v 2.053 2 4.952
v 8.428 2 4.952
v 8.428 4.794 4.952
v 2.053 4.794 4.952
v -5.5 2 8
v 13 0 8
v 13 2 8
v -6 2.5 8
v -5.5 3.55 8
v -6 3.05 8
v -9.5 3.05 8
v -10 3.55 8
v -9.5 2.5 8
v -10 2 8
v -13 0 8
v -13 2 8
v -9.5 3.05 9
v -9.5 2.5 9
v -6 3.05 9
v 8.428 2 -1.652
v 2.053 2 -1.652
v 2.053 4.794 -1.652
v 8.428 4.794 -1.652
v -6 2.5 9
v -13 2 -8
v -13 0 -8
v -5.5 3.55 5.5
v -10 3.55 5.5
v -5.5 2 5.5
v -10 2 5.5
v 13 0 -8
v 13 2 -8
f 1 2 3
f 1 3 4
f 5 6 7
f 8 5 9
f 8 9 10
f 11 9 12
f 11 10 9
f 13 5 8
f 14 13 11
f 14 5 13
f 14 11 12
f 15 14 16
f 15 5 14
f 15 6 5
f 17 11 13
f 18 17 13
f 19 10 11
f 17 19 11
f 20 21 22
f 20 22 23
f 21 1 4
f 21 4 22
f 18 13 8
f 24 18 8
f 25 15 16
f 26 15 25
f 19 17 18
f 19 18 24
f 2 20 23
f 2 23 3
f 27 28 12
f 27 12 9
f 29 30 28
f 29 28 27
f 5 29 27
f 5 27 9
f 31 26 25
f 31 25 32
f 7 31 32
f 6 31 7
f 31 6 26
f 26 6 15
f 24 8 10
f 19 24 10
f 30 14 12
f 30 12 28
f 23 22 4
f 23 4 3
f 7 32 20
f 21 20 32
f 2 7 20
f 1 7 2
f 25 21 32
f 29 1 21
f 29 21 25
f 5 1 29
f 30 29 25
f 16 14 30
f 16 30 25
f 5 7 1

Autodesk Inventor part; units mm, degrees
ref_plane "YZ Plane" through (0, 0, 0) normal (1, 0, 0) x (0, 1, 0)
ref_plane "XZ Plane" through (0, 0, 0) normal (0, 1, 0) x (-1, 0, 0)
ref_plane "XY Plane" through (0, 0, 0) normal (0, 0, 1) x (1, 0, 0)
sketch "Sketch1" plane through (0, 0, 0) normal (0, 1, 0) x (-1, 0, 0)
  line L0 (-13, 8) -> (13, 8)
  line L1 (13, 8) -> (13, -8)
  line L2 (13, -8) -> (-13, -8)
  line L3 (-13, -8) -> (-13, 8)
  line L4 (-13, 8) -> (13, -8) construction
  line L5 (13, 8) -> (-13, -8) construction
  point P0 (0, 0)
  dimension "d0" = 26
  dimension "d1" = 16
extrude "Extrusion1" add sketch "Sketch1" along normal blind 2
sketch "Sketch2" plane through (0, 2, 0) normal (0, 1, 0) x (1, 0, 0)
  line L0 (13, -8) -> (13, 8) construction
  line L1 (13, 8) -> (-13, 8) construction
  line L2 (-13, 8) -> (-13, -8) construction
  line L3 (-13, -8) -> (13, -8) construction
  line L4 (-13, 8) -> (-13, -8) construction
  line L5 (-13, -8) -> (-10, -8) construction
  line L6 (-13, -8) -> (13, -8) construction
  line L7 (-10, -8) -> (-10, -5.5)
  line L8 (-10, -5.5) -> (-5.5, -5.5)
  line L9 (-5.5, -5.5) -> (-5.5, -8)
  line L10 (-5.5, -8) -> (-10, -8)
  point P0 (0, 0)
  dimension "d4" = 3
  dimension "d5" = 2.5
  dimension "d6" = 4.5
extrude "Extrusion2" add sketch "Sketch2" along normal blind 1.55
sketch "Sketch3" plane through (-13, 0, 8) normal (0, 0, 1) x (1, 0, 0)
  line L0 (0, 0) -> (26, 0) construction
  line L1 (26, 0) -> (26, 2) construction
  line L2 (7.5, 2) -> (26, 2) construction
  line L3 (7.5, 2) -> (7.5, 3.55) construction
  line L4 (3, 3.55) -> (7.5, 3.55) construction
  line L5 (3, 2) -> (3, 3.55) construction
  line L6 (0, 2) -> (3, 2) construction
  line L7 (0, 0) -> (0, 2) construction
  line L8 (3, 3.55) -> (7.5, 3.55) construction
  line L9 (7.5, 3.55) -> (7.5, 2) construction
  line L10 (7.5, 2) -> (3, 2) construction
  line L11 (3, 2) -> (3, 3.55) construction
  line L12 (3.5, 2.5) -> (7, 2.5)
  line L13 (7, 2.5) -> (7, 3.05)
  line L14 (7, 3.05) -> (3.5, 3.05)
  line L15 (3.5, 3.05) -> (3.5, 2.5)
  point P0 (13, 0)
  dimension "d9" = 0.5
extrude "Extrusion3" add sketch "Sketch3" along normal blind 1
sketch "Sketch4" plane through (0, 2, 0) normal (0, 1, 0) x (1, 0, 0)
  line L0 (13, -8) -> (13, 8) construction
  line L1 (13, -8) -> (8.428, -8) construction
  line L2 (-13, -8) -> (13, -8) construction
  line L3 (8.428, -8) -> (8.428, -4.952) construction
  line L4 (8.428, -4.952) -> (2.0526, -4.952)
  line L5 (2.0526, -4.952) -> (2.0526, 1.652)
  line L6 (2.0526, 1.652) -> (8.428, 1.652)
  line L7 (8.428, 1.652) -> (8.428, -4.952)
  point P0 (0, 0)
  dimension "d12" = 4.572
  dimension "d13" = 3.048
  dimension "d14" = 6.3754
  dimension "d15" = 6.604
extrude "Extrusion4" add sketch "Sketch4" along normal blind 2.794
properties part number "BMS"
